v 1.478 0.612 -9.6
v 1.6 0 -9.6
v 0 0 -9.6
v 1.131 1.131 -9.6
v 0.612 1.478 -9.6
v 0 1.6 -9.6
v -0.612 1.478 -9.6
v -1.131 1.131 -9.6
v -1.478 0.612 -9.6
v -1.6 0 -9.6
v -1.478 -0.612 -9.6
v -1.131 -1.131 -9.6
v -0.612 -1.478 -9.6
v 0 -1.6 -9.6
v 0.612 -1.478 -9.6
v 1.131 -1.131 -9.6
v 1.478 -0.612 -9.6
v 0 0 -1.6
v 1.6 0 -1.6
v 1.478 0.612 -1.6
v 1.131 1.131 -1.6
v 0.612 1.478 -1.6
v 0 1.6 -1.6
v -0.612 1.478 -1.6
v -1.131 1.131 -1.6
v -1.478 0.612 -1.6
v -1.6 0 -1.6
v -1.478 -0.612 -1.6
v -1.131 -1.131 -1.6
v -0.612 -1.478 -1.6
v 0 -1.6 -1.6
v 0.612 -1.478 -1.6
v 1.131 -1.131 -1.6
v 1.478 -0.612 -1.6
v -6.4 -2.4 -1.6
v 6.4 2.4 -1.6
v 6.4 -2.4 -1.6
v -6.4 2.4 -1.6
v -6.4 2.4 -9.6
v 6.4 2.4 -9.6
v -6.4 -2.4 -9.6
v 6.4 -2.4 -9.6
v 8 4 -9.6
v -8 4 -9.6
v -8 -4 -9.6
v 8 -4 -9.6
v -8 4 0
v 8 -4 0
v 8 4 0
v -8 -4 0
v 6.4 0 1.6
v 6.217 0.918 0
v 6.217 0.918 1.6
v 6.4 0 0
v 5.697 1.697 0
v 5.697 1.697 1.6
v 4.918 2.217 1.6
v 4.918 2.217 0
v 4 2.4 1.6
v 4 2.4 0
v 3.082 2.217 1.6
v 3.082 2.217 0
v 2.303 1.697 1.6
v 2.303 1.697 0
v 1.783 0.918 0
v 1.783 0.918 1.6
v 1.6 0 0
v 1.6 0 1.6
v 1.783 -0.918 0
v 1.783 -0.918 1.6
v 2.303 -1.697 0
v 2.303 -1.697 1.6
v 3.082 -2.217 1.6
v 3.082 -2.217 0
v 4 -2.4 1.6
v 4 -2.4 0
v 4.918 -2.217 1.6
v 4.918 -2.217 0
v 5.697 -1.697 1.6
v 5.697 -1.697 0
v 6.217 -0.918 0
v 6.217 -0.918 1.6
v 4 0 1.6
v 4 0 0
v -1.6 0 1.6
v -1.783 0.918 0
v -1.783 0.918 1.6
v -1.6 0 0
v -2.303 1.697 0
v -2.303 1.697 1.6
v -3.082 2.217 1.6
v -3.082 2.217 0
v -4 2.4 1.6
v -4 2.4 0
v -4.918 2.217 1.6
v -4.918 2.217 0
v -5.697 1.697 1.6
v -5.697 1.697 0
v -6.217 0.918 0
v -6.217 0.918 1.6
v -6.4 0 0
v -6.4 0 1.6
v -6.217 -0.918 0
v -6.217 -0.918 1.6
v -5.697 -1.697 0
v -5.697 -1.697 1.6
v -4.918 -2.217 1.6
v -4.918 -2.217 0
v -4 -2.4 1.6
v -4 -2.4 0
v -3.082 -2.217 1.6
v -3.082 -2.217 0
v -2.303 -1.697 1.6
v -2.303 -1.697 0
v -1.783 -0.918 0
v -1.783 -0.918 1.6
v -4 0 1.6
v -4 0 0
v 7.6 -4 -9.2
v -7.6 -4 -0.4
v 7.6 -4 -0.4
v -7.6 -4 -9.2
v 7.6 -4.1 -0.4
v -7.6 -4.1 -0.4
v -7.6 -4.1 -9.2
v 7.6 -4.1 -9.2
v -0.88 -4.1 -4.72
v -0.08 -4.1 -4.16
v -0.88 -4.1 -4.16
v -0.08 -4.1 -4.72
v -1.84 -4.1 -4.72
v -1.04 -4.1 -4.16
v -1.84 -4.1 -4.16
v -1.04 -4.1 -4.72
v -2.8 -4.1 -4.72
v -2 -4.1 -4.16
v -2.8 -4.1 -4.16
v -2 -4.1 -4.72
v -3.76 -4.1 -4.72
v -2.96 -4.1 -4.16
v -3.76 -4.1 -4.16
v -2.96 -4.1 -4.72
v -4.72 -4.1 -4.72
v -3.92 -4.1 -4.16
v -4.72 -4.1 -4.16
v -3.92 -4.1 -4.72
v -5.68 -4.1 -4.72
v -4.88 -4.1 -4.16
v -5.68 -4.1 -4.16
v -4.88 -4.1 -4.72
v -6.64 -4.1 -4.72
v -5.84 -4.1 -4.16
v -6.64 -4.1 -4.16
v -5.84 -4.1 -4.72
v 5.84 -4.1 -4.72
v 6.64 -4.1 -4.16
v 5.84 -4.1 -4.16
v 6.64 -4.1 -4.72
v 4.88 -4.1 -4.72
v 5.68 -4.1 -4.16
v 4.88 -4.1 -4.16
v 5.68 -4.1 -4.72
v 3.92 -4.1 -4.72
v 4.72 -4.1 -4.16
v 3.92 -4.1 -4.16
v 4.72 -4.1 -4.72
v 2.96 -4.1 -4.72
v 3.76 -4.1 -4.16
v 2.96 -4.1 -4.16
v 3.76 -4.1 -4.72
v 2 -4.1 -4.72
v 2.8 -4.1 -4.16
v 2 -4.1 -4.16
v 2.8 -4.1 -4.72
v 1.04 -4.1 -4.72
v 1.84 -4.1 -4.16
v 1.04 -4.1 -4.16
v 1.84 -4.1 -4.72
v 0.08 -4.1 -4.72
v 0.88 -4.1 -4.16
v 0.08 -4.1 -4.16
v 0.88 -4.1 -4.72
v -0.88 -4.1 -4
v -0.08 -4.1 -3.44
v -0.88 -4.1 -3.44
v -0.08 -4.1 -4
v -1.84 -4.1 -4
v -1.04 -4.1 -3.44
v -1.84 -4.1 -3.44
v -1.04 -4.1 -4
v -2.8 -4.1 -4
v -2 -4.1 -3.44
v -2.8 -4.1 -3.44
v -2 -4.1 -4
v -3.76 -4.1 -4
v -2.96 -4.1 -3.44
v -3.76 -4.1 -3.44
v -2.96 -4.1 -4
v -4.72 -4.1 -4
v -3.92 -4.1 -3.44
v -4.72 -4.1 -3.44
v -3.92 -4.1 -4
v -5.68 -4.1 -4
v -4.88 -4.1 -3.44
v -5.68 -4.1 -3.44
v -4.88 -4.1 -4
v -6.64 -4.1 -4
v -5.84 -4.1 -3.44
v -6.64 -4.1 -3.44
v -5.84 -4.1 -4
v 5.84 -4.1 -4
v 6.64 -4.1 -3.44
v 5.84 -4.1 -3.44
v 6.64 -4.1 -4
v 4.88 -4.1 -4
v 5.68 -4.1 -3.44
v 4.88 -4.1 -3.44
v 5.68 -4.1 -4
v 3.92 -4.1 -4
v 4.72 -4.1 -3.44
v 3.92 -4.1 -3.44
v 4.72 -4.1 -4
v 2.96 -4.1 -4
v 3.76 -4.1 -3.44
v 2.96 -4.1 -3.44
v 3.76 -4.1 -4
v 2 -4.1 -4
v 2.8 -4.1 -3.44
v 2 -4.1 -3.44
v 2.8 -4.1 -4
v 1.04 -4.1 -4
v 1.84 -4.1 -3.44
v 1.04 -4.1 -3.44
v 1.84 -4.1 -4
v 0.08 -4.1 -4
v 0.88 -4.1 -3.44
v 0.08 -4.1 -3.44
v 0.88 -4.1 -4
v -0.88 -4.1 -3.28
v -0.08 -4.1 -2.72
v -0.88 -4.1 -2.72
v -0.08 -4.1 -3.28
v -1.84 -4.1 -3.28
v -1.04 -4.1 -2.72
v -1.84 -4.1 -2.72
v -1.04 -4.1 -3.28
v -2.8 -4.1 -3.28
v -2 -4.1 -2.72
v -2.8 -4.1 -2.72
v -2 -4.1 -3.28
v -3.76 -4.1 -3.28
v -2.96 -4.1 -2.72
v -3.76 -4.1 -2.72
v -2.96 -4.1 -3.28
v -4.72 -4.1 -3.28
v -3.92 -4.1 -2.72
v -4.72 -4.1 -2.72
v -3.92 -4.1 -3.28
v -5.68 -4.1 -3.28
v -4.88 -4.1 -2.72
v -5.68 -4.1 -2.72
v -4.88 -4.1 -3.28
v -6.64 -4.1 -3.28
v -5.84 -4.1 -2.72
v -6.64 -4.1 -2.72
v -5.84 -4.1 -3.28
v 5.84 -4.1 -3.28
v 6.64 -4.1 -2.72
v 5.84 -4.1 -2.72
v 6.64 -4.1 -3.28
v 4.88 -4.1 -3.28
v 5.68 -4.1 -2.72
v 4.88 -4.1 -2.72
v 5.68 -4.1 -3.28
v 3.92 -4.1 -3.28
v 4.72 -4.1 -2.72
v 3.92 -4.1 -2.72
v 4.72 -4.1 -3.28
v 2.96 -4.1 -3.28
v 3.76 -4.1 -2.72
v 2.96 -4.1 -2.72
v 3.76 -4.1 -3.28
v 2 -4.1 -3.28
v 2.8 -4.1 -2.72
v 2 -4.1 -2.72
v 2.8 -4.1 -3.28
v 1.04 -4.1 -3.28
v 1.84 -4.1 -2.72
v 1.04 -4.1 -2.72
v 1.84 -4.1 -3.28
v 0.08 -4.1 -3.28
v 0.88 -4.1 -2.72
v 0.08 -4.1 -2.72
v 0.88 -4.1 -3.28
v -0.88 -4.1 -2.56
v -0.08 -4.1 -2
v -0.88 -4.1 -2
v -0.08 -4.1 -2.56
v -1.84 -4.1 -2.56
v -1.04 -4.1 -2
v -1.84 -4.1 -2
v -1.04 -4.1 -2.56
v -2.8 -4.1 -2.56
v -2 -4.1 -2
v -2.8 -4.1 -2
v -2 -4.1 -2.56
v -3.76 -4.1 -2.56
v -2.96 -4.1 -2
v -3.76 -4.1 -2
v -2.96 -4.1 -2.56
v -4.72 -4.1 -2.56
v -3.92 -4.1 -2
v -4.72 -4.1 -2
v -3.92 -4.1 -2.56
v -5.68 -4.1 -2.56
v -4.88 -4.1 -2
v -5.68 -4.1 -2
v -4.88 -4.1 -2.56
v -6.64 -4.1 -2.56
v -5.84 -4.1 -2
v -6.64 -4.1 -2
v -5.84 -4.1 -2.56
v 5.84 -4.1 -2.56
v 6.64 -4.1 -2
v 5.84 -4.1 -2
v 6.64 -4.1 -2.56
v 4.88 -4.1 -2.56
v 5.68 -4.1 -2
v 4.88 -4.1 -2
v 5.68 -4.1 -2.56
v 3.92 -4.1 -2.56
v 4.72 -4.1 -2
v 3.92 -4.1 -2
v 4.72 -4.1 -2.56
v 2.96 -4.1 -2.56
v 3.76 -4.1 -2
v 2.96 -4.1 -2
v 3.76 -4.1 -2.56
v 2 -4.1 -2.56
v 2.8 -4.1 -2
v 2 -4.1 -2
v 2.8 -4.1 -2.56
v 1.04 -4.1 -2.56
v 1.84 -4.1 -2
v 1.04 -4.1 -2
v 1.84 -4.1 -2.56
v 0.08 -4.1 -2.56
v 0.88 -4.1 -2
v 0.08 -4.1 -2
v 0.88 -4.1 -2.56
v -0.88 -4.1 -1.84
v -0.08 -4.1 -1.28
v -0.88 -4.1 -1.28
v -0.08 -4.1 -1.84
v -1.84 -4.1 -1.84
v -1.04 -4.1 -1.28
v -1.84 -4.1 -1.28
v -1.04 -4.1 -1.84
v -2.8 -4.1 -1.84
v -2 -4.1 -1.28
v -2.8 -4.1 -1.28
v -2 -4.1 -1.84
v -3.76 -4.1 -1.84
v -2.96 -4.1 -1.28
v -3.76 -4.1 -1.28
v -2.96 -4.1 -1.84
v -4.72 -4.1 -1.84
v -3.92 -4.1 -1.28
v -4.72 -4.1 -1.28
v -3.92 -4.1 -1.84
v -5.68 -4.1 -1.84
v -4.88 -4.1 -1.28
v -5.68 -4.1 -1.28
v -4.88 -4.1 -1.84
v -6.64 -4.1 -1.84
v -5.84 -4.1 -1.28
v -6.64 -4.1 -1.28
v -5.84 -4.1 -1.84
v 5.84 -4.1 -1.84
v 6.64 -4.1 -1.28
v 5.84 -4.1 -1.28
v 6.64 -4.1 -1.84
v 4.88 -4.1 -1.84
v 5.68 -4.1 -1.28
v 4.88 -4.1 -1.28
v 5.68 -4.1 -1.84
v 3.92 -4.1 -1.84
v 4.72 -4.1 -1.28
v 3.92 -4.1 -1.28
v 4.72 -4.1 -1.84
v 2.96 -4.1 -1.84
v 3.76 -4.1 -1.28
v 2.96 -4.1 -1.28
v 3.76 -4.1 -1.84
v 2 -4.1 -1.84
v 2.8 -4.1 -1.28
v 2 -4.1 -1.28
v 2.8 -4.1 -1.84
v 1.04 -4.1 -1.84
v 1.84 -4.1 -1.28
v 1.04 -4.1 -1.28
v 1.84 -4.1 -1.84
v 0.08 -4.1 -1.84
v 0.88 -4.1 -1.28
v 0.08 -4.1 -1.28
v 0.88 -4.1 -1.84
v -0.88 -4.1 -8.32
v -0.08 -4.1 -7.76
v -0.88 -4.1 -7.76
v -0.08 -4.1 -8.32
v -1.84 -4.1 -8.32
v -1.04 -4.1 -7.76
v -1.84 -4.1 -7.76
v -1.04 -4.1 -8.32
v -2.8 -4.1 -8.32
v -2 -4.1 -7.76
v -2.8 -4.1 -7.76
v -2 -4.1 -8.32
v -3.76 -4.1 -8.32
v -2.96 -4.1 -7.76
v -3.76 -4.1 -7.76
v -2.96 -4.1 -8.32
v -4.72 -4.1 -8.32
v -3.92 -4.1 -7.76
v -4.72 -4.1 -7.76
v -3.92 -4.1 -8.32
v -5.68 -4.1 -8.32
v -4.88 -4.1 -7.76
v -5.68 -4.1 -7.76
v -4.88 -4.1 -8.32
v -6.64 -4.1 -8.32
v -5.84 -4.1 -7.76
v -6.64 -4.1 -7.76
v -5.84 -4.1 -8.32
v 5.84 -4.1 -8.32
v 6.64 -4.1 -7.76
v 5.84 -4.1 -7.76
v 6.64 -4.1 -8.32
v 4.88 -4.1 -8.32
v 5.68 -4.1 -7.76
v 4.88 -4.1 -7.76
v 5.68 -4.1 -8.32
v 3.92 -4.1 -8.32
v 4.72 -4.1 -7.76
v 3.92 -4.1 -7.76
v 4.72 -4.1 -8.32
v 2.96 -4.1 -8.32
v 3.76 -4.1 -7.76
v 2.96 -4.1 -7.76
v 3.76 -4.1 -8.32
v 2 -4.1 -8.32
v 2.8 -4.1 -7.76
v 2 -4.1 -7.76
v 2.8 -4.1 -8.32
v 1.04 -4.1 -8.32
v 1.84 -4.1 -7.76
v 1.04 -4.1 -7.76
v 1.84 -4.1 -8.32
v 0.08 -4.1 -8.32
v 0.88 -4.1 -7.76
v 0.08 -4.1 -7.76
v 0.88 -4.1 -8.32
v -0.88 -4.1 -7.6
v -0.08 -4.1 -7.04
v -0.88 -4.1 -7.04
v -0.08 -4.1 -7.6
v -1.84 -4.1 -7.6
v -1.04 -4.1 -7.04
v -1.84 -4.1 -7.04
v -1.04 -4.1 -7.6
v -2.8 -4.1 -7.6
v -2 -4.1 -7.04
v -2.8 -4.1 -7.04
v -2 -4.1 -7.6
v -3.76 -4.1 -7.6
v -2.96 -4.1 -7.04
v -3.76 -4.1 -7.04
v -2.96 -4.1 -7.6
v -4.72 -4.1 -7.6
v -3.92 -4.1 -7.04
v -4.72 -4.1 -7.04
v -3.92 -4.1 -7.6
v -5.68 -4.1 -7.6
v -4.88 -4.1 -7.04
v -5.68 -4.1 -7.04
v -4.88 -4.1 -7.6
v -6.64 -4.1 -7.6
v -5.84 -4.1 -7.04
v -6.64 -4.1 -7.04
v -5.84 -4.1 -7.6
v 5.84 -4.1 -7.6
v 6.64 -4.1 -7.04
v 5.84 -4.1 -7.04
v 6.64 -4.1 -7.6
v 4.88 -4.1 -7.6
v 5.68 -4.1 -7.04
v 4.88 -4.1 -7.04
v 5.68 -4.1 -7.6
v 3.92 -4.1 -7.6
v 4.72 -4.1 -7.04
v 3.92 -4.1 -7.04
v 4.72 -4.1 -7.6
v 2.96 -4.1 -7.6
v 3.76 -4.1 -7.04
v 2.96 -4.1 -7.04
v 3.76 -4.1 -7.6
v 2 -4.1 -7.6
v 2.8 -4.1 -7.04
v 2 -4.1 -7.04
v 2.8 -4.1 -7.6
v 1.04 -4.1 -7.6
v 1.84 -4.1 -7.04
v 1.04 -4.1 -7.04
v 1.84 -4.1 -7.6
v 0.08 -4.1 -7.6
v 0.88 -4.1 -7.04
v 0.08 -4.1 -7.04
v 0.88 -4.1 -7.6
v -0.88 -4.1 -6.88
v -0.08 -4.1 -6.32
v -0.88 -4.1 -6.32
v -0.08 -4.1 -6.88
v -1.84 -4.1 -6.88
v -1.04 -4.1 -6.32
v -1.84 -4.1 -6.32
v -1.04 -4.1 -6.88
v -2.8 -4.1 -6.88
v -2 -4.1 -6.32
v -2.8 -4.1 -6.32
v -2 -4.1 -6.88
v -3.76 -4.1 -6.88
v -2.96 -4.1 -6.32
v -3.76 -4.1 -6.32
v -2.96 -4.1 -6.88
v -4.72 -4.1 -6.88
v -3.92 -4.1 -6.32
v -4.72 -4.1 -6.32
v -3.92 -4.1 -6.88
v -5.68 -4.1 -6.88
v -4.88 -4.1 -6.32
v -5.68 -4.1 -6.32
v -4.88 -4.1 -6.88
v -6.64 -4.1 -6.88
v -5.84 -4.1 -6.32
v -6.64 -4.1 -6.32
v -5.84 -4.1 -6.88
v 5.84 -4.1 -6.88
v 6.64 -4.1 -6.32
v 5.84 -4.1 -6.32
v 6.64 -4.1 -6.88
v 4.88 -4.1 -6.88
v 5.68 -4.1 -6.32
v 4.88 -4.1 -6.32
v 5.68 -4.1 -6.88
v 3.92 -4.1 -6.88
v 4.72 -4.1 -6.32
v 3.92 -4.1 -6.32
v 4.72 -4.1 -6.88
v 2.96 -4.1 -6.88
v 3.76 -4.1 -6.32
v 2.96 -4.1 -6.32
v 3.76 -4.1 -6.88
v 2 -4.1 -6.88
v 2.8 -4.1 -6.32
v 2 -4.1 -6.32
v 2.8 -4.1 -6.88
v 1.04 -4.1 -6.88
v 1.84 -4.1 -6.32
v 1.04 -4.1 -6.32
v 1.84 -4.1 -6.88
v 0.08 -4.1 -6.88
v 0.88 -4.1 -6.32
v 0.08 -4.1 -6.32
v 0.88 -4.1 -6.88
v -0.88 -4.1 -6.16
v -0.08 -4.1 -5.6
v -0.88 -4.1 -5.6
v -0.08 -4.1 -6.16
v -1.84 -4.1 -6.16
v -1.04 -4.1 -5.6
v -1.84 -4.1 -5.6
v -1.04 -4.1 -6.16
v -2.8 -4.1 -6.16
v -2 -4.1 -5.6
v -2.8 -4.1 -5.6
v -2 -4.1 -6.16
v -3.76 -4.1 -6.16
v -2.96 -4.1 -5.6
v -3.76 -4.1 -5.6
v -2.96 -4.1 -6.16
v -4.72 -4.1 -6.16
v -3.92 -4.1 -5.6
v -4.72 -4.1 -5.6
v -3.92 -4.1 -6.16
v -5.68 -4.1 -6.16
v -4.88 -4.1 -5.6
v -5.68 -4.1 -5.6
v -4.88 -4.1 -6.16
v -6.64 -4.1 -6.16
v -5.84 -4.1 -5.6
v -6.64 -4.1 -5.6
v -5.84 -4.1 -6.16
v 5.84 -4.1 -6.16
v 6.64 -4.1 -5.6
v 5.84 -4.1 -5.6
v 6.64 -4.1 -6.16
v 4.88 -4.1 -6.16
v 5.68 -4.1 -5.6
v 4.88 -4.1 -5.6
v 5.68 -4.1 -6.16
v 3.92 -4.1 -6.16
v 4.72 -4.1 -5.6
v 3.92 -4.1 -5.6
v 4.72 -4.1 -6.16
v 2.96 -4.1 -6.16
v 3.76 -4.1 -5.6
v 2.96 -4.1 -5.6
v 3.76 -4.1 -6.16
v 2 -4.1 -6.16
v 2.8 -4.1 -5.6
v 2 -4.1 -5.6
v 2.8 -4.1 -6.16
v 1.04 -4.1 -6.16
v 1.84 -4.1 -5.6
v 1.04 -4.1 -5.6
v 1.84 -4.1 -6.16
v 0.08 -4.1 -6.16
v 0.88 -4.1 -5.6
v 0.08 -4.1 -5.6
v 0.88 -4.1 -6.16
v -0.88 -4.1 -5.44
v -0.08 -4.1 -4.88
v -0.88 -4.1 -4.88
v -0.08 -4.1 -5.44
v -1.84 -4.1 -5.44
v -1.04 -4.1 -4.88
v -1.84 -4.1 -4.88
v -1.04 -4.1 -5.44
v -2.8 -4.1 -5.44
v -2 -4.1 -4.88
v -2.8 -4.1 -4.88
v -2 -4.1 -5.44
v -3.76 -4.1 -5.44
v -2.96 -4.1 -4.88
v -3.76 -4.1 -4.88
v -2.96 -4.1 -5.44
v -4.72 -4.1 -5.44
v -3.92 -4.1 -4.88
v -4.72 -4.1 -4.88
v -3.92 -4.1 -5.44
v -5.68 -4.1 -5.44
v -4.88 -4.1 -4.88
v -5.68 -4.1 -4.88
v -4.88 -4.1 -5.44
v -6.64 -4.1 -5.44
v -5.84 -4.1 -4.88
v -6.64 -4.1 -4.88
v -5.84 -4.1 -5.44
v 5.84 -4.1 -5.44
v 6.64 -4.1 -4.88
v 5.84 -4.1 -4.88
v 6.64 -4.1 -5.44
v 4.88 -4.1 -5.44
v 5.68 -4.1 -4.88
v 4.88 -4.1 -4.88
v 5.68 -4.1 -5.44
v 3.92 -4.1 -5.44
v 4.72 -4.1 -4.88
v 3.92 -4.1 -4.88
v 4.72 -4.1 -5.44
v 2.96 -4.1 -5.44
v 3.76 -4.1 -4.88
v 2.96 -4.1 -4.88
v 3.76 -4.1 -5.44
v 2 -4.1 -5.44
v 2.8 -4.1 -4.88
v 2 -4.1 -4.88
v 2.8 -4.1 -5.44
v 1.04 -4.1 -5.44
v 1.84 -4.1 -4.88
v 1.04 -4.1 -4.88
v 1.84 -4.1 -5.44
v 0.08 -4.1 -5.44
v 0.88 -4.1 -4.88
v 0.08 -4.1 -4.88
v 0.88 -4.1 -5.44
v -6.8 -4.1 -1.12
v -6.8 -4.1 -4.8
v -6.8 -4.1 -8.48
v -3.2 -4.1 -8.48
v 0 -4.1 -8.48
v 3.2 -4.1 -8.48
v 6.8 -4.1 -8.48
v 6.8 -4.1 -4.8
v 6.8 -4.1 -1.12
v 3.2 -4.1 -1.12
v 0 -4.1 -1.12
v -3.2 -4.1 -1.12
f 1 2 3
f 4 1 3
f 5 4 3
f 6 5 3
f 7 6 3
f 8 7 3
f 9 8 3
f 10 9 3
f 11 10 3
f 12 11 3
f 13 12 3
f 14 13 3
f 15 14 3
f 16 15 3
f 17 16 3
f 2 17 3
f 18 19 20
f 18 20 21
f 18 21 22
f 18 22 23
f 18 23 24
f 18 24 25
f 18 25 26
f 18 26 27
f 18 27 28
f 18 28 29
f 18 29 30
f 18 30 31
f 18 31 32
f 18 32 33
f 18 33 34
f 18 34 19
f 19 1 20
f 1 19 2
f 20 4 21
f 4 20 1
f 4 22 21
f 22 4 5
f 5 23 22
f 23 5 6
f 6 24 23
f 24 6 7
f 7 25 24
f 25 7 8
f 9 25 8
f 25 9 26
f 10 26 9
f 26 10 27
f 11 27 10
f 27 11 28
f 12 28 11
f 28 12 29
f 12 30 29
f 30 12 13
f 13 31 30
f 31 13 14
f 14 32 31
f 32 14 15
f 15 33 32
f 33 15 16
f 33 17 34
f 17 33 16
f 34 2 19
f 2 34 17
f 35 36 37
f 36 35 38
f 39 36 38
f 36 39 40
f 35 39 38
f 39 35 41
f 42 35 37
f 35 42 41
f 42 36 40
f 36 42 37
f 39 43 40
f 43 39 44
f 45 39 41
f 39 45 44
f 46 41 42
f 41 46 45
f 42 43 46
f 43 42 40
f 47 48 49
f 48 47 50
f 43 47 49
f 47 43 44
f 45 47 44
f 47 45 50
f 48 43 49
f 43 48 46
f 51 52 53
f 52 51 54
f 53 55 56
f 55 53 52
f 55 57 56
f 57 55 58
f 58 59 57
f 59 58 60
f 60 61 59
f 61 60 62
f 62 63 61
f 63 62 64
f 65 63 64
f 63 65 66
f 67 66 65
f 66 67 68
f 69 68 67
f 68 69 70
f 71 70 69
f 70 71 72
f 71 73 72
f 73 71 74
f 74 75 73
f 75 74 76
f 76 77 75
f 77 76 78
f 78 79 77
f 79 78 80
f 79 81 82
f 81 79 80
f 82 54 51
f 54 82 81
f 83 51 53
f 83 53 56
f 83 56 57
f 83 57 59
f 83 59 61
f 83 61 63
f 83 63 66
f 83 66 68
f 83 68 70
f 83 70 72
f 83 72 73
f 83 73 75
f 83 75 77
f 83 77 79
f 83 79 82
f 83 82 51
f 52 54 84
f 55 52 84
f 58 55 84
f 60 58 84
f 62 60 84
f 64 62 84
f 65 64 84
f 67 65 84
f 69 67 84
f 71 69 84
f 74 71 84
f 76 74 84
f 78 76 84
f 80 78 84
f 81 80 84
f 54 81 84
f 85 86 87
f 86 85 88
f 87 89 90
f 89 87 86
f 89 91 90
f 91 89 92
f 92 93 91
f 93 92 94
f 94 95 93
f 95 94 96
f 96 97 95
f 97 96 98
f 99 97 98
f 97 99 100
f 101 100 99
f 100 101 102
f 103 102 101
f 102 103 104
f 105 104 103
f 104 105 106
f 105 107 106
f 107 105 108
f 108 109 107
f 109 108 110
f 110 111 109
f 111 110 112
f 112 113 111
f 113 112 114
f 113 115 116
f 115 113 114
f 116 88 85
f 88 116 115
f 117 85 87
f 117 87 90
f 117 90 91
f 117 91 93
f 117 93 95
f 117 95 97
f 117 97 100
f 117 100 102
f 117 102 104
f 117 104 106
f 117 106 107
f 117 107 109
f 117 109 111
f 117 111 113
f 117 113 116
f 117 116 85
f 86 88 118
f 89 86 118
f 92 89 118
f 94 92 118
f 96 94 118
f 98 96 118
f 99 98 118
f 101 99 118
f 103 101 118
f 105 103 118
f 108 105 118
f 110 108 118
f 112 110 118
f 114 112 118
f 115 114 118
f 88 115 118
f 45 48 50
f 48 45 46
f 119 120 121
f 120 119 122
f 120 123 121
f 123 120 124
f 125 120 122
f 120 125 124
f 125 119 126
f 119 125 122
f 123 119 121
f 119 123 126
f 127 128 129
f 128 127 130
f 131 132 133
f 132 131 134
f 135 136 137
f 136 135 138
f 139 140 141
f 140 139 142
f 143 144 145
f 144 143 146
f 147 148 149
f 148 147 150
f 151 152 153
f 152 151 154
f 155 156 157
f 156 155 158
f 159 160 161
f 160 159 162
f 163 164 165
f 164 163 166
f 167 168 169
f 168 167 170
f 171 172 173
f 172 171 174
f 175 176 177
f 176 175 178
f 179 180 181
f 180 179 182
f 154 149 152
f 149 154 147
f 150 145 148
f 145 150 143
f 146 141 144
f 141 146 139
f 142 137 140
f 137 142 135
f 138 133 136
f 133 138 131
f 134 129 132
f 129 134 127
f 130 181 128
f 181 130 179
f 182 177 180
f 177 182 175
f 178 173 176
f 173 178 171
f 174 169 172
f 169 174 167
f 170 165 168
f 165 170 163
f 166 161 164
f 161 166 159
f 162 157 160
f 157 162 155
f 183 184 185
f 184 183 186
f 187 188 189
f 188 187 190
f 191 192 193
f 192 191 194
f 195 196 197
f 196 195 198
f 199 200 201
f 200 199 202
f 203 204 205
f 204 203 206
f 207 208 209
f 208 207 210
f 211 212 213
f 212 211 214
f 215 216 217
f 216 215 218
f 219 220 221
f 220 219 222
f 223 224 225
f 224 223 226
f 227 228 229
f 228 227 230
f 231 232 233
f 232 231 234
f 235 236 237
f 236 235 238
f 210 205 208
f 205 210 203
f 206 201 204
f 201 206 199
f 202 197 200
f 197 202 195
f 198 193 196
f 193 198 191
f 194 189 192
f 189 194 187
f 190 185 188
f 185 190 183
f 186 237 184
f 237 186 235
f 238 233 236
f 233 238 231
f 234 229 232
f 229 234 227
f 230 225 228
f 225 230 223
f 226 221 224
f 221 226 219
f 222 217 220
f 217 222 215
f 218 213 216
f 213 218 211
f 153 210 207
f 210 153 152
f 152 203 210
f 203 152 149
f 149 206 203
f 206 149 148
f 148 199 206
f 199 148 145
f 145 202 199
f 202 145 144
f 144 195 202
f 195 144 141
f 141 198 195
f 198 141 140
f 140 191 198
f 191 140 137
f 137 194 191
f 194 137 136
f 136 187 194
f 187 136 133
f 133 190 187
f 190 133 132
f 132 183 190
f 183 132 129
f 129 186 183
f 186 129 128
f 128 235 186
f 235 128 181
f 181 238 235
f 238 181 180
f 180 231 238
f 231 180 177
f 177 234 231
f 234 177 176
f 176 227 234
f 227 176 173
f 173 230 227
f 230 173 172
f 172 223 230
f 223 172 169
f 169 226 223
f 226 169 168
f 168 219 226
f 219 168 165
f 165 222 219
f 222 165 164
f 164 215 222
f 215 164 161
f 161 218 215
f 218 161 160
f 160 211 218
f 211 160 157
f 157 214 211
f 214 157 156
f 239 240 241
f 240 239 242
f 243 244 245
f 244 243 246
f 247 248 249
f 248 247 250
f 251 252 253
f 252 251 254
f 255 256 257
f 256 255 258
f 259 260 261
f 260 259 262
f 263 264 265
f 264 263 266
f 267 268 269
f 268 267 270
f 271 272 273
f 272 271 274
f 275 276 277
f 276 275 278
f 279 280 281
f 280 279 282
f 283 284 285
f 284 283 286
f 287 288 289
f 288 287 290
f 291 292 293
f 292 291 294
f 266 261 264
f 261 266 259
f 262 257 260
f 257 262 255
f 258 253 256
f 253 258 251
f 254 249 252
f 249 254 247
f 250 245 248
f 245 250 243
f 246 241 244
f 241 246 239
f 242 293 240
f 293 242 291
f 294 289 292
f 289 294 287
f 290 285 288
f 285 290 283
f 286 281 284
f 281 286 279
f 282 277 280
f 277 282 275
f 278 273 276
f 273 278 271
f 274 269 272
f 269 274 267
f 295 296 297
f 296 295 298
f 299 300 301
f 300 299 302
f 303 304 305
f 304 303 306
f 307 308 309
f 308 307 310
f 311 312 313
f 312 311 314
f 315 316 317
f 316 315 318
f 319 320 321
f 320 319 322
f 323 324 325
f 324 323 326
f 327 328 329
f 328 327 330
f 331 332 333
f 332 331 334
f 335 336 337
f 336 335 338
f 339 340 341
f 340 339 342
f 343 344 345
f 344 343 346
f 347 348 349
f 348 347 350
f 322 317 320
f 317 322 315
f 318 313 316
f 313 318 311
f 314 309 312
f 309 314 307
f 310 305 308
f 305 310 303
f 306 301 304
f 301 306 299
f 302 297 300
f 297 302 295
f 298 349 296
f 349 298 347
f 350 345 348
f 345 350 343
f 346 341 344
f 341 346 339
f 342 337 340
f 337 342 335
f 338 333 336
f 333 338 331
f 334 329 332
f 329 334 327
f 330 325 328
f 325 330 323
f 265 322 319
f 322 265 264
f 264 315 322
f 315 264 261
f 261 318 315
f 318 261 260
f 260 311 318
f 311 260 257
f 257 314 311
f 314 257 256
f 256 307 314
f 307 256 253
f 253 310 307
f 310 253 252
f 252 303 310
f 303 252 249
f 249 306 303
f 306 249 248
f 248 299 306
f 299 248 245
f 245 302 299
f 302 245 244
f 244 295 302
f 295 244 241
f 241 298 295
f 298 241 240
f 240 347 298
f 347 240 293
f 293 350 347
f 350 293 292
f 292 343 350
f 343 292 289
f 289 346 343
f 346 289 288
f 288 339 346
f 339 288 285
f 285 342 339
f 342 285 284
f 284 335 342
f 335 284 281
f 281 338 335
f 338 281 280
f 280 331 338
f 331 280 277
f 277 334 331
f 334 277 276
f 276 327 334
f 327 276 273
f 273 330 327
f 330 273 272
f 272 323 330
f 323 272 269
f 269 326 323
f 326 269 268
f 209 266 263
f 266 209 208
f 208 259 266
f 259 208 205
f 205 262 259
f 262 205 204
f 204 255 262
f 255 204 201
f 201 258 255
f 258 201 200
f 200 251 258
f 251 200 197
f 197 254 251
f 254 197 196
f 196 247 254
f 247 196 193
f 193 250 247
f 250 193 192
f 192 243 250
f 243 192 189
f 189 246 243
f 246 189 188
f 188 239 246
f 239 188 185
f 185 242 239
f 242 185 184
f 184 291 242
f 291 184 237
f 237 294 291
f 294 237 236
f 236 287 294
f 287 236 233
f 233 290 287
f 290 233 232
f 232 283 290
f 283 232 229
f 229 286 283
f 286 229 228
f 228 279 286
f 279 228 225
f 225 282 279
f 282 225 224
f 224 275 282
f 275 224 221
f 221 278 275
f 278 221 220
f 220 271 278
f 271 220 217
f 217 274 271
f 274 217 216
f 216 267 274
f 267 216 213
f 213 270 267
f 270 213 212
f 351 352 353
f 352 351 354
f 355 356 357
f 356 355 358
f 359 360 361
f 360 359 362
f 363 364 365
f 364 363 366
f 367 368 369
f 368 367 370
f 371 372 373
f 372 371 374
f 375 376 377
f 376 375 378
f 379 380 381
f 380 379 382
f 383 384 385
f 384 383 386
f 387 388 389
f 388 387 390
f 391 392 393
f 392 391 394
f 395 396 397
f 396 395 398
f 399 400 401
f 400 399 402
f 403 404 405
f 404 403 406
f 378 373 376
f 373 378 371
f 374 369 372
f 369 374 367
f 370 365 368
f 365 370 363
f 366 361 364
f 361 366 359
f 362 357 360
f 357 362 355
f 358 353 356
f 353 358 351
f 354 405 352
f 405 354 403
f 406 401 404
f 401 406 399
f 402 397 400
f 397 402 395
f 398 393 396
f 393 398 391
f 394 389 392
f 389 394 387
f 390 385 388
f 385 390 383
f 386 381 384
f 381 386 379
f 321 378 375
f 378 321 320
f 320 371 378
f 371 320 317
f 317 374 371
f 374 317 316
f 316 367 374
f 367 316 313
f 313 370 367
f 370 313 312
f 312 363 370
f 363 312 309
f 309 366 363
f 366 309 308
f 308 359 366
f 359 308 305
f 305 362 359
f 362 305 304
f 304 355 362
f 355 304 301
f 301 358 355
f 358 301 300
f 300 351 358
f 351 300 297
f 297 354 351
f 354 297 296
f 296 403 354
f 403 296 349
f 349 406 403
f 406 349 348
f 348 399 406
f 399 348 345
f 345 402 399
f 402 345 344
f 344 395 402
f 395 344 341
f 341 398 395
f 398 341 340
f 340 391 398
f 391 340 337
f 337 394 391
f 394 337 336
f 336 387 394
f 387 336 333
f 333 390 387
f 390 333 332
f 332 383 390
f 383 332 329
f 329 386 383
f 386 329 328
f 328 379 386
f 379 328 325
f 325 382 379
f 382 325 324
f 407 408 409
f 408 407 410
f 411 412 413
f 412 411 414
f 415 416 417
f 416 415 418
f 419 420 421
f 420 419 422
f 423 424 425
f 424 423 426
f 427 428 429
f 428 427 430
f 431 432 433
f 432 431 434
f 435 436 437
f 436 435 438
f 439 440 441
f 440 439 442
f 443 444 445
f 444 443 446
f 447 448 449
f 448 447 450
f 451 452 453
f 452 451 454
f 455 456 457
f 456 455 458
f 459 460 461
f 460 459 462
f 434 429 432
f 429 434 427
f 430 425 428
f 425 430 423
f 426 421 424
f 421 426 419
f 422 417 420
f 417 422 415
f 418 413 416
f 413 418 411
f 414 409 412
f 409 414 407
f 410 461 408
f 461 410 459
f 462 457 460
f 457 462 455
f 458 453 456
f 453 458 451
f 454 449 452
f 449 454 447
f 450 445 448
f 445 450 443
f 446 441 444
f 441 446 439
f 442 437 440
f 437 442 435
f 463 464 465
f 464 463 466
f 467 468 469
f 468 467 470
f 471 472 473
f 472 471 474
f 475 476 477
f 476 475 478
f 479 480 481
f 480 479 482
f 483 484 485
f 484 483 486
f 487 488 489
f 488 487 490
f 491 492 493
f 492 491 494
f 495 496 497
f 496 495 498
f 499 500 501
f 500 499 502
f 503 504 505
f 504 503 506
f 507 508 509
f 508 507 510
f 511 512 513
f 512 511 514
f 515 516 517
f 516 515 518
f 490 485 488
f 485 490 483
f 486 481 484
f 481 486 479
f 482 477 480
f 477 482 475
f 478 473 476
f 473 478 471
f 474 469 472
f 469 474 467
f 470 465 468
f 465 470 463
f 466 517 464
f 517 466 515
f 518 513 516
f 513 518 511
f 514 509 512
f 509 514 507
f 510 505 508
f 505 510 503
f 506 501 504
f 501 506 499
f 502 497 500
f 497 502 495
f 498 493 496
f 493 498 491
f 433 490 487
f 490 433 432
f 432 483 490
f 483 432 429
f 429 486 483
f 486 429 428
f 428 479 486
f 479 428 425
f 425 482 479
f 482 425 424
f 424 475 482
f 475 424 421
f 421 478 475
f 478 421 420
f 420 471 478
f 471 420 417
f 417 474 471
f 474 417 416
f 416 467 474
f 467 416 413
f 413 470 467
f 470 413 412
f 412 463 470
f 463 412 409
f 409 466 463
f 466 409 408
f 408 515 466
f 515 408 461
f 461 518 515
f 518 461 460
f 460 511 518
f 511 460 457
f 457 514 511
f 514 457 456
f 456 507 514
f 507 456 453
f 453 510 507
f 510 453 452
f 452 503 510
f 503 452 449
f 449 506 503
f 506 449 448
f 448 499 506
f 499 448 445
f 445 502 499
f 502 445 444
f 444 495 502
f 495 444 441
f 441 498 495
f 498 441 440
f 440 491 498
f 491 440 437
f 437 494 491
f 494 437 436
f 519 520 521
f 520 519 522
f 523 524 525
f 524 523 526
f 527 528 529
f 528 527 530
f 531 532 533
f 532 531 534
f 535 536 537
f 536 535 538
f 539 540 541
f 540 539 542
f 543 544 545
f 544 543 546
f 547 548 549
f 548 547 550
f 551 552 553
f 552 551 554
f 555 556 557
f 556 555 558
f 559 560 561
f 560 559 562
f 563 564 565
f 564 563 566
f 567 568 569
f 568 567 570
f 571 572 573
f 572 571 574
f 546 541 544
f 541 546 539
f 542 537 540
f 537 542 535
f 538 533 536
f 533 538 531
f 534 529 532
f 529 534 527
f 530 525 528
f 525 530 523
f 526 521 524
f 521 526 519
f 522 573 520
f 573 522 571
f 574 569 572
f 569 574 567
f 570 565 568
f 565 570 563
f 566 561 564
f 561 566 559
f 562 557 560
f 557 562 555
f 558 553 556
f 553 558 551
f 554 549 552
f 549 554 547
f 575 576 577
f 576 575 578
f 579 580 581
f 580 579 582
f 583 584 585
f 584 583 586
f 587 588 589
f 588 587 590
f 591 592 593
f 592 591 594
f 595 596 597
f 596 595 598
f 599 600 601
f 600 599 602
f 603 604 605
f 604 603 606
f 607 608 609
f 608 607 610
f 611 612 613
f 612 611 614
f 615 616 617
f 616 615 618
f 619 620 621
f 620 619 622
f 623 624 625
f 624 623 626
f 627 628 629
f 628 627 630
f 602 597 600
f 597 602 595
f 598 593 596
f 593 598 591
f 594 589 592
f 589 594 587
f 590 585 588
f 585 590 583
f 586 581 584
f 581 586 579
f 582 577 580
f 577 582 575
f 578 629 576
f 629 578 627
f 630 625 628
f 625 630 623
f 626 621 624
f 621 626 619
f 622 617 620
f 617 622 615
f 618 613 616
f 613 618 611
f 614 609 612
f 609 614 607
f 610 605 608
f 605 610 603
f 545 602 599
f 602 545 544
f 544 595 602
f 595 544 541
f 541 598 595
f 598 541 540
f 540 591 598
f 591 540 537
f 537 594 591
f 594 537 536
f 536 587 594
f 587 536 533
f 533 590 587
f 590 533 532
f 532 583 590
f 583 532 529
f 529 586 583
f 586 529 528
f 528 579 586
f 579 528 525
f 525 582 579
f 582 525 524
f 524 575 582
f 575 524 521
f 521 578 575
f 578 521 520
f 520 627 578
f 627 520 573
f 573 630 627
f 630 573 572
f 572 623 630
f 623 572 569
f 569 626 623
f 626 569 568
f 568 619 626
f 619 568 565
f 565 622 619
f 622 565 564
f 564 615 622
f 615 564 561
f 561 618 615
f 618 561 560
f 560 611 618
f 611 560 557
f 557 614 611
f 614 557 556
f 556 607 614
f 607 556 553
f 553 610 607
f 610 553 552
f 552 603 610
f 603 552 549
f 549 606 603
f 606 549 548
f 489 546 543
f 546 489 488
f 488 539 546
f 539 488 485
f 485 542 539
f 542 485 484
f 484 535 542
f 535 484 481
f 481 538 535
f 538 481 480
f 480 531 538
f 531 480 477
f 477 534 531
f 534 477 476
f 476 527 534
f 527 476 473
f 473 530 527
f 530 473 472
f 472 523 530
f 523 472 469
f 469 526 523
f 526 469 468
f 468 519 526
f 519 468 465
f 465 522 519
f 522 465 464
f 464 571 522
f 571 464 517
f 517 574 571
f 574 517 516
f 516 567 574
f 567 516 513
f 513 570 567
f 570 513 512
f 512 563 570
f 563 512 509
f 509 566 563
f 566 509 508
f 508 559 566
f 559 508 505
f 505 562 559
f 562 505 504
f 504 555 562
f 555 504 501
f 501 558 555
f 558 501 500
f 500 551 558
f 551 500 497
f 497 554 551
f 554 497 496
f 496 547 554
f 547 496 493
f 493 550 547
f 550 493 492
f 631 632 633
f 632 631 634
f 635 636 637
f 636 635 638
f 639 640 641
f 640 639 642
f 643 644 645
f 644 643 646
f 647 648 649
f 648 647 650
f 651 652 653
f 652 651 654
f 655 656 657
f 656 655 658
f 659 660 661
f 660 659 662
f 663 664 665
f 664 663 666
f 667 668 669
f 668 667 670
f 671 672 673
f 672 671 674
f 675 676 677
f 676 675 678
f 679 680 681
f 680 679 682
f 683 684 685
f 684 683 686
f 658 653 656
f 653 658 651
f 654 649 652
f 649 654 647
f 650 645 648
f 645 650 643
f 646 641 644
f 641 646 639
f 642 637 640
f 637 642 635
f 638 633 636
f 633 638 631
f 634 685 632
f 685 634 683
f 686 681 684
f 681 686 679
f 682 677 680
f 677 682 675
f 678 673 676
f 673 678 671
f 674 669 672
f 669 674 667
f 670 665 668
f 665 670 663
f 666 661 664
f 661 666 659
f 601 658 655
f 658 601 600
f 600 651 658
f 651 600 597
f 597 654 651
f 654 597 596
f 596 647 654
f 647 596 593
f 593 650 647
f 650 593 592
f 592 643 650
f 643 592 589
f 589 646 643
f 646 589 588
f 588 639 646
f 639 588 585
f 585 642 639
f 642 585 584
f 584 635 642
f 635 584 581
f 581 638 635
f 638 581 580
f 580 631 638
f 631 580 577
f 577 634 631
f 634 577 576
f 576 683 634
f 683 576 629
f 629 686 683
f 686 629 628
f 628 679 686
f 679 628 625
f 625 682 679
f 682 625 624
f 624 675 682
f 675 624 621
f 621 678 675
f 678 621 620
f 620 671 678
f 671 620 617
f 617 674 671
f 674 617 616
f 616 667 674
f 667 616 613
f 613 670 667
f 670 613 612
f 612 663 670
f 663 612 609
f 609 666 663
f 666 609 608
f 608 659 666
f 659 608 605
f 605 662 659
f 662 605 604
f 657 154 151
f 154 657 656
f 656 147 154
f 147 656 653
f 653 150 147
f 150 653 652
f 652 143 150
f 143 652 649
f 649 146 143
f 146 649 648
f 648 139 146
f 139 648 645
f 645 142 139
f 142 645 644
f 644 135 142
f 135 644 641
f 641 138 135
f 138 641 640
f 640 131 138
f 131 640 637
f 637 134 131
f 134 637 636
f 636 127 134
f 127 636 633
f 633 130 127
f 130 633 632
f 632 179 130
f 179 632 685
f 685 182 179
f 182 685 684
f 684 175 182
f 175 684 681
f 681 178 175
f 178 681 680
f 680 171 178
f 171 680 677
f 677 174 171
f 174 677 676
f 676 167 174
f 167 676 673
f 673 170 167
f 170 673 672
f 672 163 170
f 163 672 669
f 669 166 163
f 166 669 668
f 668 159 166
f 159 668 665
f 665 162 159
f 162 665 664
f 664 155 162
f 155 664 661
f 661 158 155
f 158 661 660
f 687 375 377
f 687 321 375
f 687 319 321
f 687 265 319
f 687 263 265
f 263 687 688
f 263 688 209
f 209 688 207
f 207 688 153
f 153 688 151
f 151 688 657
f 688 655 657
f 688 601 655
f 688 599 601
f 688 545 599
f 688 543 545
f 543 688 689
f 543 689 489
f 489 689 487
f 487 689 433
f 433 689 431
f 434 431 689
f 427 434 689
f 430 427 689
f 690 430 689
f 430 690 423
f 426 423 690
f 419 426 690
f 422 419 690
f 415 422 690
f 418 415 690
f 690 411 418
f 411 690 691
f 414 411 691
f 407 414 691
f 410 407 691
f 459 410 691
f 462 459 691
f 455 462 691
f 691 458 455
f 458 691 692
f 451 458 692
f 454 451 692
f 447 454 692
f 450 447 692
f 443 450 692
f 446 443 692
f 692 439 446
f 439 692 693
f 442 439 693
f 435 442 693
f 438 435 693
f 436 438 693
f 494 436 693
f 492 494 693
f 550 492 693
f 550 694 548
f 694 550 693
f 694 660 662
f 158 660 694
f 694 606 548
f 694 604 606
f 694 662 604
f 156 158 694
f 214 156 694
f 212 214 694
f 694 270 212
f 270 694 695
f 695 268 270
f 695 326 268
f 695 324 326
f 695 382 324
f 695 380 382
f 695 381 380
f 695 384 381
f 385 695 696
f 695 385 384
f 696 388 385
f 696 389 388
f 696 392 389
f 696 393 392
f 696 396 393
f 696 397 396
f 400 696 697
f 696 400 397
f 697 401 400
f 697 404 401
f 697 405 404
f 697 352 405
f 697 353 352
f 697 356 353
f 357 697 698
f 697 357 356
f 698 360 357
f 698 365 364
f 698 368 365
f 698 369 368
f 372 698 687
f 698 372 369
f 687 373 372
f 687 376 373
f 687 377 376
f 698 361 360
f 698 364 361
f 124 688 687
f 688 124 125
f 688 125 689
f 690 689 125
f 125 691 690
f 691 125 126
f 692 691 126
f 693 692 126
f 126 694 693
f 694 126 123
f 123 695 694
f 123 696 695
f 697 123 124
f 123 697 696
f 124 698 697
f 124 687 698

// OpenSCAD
use <../lib.scad>
use <192385f.scad>
use <3004.scad>
function ldraw_lib__3004d0j() = [
// 0 Brick  1 x  2 with White and Black Grille Sticker
// 0 Name: 3004d0j.dat
// 0 Author: Takeshi Takahashi [RainbowDolphin]
// 0 !LDRAW_ORG Shortcut UPDATE 2024-06
// 0 !LICENSE Licensed under CC BY 4.0 : see CAreadme.txt
// 
// 0 BFC CERTIFY CCW
  [0,"BFC","CERTIFY"],
  [0,"BFC","CCW"],
// 
// 0 !CATEGORY Sticker Shortcut
// 0 !KEYWORDS Bricklink 3004pb032a, Car, Fire engine, Set 6390, Set 6690
// 
// 0 !HISTORY 2024-07-29 [OrionP] Official Update 2024-06
// 
// 1 16 0 0 0 1 0 0 0 1 0 0 0 1 3004.dat
  [1,16,0,0,0,1,0,0,0,1,0,0,0,1, ldraw_lib__3004()],
// 1 16 0 12 -10 1 0 0 0 0 -1 0 1 0 192385f.dat
  [1,16,0,12,-10,1,0,0,0,0,-1,0,1,0, ldraw_lib__192385f()],
];
module ldraw_lib__3004d0j(step=0, col=false, unit=2/5, alt=false, line=0.2, solid=!$preview)
    makepoly(ldraw_lib__3004d0j(), step=step, col=col, unit=unit, alt=alt, line=line, solid=solid);
ldraw_lib__3004d0j(line=0.2);
